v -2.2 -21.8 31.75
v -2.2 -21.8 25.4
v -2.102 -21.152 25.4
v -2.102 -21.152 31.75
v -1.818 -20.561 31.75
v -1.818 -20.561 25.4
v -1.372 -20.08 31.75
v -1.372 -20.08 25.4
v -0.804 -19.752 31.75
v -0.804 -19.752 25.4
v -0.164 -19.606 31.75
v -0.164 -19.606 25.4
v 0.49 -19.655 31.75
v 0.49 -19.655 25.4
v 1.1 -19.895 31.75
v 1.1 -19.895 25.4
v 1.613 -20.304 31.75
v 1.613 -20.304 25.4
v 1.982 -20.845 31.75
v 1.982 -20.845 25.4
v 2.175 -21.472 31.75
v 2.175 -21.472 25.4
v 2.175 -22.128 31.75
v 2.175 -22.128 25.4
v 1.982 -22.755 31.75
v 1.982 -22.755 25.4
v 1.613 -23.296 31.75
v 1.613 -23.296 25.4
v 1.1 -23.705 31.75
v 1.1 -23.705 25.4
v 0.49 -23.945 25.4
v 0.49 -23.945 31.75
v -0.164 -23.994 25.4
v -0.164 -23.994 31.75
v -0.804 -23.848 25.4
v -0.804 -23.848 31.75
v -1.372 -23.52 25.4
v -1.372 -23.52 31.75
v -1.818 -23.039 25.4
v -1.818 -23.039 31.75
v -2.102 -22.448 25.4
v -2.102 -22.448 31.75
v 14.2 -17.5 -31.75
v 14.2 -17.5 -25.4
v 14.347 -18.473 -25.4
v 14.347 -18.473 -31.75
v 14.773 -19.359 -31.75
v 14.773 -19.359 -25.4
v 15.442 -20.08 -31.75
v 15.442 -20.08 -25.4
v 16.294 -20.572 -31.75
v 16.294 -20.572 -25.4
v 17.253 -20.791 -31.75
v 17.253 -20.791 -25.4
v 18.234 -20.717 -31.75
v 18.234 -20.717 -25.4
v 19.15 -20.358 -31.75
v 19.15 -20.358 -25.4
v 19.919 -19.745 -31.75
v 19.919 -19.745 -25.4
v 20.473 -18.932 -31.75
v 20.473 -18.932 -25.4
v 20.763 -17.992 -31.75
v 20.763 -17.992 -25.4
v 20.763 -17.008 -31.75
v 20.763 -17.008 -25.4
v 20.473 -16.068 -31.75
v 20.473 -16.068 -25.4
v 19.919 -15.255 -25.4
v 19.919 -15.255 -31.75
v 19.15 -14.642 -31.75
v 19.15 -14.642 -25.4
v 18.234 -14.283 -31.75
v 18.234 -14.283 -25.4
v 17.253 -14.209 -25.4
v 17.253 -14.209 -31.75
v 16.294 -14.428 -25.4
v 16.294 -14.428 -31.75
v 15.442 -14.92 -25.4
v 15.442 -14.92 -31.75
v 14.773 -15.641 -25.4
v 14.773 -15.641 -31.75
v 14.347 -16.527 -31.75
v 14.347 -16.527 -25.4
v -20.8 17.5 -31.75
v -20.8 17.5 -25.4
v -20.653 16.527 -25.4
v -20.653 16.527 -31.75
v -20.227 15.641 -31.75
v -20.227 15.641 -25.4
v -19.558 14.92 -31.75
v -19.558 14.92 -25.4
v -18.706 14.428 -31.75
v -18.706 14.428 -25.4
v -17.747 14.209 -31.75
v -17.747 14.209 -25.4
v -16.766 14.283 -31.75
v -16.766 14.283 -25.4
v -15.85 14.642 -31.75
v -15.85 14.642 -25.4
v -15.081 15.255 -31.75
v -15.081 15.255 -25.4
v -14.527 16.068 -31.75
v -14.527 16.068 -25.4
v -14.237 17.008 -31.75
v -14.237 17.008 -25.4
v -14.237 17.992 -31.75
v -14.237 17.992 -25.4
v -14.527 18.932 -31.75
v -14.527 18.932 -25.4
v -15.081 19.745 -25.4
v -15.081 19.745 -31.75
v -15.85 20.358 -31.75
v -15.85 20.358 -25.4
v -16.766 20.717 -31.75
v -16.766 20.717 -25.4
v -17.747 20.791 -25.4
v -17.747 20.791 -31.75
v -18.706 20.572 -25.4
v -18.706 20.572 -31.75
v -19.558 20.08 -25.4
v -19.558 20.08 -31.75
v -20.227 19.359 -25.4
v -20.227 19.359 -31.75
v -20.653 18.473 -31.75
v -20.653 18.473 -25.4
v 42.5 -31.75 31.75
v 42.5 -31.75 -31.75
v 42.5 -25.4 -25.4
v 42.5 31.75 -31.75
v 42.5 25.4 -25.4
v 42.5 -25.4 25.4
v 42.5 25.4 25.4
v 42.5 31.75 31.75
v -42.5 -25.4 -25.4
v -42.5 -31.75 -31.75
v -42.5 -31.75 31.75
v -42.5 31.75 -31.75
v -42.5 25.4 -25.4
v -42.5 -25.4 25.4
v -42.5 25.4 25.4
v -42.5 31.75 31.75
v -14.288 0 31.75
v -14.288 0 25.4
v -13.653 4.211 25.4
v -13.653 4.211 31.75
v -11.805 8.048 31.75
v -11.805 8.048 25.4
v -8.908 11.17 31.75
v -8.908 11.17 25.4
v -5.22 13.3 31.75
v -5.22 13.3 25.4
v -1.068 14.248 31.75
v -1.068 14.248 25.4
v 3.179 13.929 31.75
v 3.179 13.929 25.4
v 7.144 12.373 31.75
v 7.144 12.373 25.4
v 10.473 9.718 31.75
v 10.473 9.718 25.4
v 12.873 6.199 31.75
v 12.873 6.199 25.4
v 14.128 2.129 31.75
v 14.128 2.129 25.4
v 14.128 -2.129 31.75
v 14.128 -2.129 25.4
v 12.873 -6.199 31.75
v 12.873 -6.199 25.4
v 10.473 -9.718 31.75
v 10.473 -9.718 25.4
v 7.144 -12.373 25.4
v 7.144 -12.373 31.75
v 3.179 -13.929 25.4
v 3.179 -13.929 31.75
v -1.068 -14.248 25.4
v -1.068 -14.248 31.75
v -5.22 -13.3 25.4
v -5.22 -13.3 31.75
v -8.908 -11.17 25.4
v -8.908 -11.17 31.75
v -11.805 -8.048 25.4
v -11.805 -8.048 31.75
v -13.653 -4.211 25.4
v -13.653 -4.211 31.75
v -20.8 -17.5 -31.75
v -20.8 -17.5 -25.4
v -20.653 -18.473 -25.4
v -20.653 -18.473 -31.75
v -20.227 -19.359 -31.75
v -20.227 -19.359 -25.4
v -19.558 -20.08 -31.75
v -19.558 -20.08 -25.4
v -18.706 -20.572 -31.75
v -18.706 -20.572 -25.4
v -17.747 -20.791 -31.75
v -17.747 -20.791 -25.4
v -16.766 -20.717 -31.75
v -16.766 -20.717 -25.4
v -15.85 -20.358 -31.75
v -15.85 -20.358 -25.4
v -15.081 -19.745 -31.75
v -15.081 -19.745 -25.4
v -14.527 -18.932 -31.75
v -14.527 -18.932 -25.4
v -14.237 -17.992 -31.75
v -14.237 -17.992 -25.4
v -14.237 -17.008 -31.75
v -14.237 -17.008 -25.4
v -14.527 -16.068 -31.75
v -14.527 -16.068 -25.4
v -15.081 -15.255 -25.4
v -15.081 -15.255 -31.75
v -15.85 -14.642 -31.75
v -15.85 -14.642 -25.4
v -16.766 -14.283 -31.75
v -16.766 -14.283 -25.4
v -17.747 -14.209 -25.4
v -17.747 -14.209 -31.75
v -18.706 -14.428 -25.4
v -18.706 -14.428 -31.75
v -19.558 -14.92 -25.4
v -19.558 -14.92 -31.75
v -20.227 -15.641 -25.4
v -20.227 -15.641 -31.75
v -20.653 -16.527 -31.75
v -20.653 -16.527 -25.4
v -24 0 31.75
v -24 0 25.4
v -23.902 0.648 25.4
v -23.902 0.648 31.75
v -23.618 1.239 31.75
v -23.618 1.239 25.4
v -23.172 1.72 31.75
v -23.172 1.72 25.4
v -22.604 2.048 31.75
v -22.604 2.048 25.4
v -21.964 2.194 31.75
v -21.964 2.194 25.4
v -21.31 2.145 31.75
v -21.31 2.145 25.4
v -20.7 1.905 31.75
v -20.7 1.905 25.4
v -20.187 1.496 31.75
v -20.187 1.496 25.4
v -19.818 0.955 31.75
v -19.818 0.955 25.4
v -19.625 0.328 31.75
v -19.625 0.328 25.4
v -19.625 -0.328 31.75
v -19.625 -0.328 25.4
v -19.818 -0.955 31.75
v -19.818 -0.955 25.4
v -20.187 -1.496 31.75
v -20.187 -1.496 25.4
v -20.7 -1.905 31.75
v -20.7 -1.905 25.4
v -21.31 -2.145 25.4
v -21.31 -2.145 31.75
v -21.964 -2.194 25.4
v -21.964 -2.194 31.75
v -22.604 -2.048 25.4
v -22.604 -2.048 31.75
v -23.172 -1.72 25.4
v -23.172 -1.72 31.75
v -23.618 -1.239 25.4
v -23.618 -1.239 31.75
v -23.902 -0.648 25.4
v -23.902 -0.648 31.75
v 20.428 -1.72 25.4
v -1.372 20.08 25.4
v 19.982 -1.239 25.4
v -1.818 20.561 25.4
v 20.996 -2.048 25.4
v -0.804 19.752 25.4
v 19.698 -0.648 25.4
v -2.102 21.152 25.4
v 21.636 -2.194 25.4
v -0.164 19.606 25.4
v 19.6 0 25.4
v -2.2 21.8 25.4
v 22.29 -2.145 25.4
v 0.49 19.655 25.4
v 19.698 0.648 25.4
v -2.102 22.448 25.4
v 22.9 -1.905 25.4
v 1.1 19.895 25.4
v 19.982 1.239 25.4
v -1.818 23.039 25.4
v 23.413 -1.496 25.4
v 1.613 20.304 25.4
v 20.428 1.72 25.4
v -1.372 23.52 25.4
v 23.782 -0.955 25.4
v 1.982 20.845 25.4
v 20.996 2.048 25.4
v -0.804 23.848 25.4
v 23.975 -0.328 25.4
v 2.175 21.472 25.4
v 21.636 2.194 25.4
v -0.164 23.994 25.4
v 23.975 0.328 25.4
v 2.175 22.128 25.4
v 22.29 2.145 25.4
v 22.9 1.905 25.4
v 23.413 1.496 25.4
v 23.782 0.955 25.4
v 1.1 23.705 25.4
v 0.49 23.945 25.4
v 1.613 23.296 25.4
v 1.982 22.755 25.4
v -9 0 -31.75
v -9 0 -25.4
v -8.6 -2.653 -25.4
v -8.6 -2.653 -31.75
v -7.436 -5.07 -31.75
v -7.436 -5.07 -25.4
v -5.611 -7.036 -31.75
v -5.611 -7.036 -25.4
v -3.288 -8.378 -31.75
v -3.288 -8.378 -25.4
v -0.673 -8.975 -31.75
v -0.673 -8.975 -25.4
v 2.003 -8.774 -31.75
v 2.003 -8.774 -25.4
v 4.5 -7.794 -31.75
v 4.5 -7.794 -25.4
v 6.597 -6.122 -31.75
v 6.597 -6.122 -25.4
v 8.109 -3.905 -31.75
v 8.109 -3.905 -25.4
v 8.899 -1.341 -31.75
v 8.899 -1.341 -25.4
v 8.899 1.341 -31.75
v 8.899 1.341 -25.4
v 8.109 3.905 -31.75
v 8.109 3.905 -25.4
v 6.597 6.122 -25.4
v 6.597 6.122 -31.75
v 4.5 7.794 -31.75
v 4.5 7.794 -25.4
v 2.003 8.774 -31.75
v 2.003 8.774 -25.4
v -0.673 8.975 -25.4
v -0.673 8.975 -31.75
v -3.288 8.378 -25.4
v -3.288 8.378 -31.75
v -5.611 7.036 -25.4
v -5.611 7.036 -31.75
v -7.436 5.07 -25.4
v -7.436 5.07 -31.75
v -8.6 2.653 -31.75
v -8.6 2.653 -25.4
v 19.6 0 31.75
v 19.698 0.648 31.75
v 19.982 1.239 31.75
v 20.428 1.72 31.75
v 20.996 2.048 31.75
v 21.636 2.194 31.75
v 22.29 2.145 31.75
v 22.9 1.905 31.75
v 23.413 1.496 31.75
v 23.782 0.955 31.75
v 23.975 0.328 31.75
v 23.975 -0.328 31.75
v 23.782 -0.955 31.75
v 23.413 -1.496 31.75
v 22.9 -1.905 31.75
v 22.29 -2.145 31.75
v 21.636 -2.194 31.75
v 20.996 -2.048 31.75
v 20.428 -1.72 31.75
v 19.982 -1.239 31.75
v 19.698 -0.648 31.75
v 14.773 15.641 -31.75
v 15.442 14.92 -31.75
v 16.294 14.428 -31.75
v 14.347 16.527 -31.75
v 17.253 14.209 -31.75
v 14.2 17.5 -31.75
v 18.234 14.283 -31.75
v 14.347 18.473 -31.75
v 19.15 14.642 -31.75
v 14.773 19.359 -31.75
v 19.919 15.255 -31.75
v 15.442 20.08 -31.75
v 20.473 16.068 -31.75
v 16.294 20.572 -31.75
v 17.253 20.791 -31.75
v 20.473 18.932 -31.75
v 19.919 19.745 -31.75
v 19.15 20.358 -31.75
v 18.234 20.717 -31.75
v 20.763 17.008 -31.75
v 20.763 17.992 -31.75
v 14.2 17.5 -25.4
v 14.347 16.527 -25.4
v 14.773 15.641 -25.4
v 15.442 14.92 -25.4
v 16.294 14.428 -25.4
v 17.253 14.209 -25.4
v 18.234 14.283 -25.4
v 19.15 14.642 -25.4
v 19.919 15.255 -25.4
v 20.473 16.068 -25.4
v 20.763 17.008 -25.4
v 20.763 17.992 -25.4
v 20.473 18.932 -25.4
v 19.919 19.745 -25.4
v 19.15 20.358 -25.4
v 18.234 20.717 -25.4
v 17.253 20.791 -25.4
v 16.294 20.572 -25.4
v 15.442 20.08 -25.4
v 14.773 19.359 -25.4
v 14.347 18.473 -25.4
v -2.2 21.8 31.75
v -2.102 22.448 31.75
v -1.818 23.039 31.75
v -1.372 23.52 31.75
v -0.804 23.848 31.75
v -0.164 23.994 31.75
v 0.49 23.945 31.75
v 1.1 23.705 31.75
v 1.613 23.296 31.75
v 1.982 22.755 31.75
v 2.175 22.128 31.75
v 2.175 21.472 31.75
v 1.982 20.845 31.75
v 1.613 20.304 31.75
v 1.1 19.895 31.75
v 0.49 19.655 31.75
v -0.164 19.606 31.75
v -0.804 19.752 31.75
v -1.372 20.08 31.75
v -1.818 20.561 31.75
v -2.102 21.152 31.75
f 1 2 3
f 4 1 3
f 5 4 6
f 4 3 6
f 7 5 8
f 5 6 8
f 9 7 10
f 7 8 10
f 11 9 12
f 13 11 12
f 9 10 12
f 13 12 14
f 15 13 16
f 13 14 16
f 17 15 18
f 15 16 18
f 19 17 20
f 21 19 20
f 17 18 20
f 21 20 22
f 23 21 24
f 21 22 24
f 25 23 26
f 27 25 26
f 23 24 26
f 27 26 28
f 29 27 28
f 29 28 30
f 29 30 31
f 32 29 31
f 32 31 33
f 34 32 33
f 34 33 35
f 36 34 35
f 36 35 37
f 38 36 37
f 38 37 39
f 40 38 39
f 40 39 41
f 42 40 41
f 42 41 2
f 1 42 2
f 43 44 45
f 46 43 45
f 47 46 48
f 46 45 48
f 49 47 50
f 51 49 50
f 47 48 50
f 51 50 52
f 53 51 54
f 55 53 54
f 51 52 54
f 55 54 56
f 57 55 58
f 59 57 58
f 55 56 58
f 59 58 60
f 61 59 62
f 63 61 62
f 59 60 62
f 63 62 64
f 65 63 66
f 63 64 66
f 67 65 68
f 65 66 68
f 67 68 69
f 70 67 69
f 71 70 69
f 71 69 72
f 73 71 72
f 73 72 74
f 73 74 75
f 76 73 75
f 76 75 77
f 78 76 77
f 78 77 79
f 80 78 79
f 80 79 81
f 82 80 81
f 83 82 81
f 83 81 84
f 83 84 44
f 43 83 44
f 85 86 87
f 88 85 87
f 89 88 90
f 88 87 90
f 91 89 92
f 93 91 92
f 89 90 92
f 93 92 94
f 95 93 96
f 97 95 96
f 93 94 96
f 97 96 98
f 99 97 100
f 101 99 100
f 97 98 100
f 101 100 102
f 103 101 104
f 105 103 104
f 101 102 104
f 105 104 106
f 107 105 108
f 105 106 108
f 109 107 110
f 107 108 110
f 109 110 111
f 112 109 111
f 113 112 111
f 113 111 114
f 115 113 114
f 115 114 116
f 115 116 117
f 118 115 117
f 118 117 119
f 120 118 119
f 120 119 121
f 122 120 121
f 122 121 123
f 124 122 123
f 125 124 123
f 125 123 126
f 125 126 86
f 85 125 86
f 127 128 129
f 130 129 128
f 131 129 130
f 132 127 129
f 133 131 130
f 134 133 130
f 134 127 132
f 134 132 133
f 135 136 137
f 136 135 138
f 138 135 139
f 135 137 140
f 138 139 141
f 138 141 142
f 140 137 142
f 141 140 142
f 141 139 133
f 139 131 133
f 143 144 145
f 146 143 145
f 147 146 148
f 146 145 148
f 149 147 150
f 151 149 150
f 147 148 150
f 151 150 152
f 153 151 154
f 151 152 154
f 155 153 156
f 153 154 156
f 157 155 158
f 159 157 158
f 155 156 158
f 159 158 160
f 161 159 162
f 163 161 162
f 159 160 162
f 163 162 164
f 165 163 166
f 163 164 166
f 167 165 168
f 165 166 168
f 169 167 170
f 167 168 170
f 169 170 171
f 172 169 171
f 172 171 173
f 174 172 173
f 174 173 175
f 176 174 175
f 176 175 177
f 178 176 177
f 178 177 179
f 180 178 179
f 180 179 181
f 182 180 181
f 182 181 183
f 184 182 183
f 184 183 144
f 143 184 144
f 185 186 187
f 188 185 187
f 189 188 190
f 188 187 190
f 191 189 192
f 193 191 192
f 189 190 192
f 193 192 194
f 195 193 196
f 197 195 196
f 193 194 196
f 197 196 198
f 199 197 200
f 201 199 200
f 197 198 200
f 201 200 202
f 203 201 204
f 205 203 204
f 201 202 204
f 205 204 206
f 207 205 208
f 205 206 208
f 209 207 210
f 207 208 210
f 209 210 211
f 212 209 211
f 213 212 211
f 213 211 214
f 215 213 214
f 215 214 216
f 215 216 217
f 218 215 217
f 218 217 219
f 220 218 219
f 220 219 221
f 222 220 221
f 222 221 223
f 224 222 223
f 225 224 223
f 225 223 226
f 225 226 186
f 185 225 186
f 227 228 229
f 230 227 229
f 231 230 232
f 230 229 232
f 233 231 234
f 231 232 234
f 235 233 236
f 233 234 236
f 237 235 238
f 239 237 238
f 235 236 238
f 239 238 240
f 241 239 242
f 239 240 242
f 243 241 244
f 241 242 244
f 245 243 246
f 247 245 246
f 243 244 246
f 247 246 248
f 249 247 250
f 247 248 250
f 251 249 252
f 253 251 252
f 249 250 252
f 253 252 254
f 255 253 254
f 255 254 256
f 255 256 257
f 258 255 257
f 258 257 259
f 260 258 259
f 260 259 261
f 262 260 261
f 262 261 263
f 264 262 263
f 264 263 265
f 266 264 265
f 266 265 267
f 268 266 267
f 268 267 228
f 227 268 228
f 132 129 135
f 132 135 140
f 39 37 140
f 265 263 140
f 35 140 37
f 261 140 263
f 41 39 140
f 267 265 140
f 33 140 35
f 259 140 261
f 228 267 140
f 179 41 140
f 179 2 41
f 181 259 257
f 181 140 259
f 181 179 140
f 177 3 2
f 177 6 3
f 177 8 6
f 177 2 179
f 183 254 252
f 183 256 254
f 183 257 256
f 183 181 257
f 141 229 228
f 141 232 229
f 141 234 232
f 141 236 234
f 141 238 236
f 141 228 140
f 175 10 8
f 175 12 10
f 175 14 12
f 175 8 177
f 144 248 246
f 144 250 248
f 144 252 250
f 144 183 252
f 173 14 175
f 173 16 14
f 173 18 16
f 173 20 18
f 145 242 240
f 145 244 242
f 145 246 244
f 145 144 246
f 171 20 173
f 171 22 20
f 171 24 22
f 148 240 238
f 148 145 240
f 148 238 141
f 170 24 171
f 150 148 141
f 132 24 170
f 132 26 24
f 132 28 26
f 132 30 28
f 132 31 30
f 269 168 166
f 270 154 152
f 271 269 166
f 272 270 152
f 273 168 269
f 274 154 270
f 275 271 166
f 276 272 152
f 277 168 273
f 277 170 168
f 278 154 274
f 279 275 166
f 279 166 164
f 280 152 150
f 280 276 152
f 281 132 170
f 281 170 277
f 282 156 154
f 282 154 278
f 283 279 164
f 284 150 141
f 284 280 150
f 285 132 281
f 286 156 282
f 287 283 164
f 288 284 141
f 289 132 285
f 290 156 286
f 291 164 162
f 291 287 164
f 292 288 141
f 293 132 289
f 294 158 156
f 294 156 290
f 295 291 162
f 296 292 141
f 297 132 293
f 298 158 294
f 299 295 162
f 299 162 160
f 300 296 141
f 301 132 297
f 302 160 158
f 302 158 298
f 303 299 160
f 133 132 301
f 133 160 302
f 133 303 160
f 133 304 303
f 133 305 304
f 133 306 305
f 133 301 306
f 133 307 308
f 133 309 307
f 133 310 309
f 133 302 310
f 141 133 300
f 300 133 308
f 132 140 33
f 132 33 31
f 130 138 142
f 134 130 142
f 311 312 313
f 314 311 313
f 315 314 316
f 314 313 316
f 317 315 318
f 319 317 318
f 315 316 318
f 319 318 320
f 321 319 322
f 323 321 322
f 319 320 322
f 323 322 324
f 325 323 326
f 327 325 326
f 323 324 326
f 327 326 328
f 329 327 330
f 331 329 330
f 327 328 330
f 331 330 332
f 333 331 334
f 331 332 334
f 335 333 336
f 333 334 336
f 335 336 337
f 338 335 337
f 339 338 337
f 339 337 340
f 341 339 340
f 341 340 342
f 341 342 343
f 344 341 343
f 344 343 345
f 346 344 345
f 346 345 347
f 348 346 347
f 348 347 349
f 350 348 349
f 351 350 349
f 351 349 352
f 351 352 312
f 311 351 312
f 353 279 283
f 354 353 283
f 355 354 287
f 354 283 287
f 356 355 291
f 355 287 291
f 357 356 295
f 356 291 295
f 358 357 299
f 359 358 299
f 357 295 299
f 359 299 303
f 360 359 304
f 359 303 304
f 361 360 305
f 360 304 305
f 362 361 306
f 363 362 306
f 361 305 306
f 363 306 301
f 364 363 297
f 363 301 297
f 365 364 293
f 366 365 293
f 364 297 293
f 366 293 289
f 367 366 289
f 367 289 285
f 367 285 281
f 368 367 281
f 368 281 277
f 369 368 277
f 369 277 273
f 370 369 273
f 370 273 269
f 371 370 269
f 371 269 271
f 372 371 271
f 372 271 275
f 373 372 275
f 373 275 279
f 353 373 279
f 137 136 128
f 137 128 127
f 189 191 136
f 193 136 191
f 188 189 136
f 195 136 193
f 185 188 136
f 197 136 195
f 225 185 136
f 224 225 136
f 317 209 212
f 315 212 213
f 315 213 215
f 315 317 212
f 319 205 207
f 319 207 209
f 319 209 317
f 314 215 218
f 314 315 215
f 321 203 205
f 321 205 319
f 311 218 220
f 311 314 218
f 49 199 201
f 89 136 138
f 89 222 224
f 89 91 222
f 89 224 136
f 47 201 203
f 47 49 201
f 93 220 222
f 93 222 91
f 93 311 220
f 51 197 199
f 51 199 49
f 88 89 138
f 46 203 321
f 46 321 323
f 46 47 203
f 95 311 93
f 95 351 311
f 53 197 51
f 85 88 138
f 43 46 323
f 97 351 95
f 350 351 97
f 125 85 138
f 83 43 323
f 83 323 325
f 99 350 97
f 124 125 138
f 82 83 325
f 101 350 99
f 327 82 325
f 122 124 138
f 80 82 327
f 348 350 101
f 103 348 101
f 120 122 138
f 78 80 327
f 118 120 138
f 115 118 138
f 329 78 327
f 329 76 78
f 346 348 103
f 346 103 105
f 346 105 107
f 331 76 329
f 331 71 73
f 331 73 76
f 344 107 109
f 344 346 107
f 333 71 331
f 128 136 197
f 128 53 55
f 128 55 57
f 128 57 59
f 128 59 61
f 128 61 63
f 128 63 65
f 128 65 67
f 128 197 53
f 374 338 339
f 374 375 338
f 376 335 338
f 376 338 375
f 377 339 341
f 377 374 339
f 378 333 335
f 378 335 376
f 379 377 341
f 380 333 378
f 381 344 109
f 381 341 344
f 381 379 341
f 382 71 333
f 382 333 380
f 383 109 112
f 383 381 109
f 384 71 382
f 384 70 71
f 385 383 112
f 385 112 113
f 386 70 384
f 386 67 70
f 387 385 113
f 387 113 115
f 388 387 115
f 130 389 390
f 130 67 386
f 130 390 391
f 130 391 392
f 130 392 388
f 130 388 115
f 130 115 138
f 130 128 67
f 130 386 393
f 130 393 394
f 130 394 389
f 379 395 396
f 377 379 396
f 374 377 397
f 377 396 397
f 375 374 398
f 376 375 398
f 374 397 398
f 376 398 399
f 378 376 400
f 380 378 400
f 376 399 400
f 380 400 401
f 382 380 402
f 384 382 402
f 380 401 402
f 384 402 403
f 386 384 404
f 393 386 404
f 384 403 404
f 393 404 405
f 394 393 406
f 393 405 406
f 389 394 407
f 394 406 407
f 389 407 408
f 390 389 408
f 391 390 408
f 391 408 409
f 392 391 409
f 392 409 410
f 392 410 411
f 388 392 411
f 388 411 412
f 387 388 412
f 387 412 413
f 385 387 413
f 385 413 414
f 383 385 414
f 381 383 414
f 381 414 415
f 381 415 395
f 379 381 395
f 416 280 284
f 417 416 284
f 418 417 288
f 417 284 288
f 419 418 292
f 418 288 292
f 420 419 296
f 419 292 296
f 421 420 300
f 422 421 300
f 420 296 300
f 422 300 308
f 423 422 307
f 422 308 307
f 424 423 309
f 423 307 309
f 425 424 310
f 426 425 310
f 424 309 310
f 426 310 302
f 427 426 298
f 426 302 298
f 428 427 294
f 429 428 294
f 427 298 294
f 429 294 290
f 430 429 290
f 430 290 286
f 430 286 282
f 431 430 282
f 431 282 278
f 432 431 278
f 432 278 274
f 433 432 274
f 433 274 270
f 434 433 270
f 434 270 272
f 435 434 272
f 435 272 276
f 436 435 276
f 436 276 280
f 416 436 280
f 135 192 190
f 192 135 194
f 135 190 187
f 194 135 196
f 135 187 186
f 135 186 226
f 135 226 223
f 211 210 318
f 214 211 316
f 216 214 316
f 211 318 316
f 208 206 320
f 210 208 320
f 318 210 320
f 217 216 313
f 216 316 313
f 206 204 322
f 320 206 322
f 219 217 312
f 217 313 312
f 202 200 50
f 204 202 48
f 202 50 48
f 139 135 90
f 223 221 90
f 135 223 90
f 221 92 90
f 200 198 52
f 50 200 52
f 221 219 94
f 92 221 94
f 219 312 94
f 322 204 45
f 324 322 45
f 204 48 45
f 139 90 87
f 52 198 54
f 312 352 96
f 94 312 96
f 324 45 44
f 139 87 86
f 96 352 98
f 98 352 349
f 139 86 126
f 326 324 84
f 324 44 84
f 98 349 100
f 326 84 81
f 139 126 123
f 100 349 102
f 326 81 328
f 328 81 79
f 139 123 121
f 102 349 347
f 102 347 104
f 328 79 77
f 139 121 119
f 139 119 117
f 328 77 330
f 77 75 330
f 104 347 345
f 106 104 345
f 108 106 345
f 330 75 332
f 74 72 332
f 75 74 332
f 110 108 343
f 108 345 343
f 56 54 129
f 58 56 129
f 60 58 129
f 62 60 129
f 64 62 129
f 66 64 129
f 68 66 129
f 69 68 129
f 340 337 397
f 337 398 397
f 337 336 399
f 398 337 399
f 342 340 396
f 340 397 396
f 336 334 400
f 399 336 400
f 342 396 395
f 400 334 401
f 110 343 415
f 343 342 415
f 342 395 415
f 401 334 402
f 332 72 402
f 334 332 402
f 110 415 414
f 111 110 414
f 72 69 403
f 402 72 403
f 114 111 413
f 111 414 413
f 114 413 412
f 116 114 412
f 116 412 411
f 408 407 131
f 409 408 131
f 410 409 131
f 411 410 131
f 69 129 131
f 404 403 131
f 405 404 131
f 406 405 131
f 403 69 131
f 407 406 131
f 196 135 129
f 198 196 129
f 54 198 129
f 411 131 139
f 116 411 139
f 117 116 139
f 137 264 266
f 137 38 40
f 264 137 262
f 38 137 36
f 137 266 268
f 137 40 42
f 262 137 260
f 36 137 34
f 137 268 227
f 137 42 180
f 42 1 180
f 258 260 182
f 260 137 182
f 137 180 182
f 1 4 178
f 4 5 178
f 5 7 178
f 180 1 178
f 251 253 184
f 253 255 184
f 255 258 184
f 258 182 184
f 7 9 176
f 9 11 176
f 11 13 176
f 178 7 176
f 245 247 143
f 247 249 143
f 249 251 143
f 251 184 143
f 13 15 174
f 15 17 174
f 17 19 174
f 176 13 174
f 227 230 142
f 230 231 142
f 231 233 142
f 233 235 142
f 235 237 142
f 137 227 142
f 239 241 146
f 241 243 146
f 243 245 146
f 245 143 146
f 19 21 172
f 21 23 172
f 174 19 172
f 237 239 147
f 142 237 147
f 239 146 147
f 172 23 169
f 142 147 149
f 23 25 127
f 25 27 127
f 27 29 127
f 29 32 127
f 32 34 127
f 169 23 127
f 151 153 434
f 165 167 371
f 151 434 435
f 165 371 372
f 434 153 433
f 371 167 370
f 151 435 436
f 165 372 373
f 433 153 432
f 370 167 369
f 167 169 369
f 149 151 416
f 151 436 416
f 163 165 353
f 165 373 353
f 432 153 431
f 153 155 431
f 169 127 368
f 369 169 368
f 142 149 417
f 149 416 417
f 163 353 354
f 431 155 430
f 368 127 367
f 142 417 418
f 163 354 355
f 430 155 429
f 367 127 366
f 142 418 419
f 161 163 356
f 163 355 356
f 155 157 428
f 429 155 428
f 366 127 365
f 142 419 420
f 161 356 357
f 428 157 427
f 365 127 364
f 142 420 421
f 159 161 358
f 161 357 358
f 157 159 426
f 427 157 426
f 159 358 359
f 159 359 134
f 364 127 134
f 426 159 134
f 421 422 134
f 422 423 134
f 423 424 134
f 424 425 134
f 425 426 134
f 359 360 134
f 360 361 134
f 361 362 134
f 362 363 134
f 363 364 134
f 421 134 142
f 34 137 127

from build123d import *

# Parameters (mm, degrees)
F0_W          = 63.5
F0_H          = 63.5
F0_W_2        = 50.8
F0_H_2        = 50.8
F1_DEPTH      = 42.5
F1_DEPTH_BACK = 42.5
F3_D          = 4.4
F3_DEPTH      = 14.1
F3_TIP        = 1.3218933619
F5_D          = 28.575
F5_DEPTH      = 10
F5_TIP        = 8.5847960944
F7_D          = 6.6
F7_DEPTH      = 10
F7_TIP        = 1.9828400428
F9_D          = 18
F9_DEPTH      = 10
F9_TIP        = 5.4077455712


with BuildPart() as f1:
    # F0 (on Right) → F1 (new body, two sides)
    with BuildSketch(Plane.YZ) as f1_sk:
        Rectangle(F0_W, F0_H)
        Rectangle(F0_W_2, F0_H_2, mode=Mode.SUBTRACT)
    extrude(amount=F1_DEPTH)
    extrude(f1_sk.sketch, amount=-F1_DEPTH_BACK)

    # F3
    with Locations(Plane.XY.offset(31.75)):
        with Locations((-21.8, 0), (0, -21.8), (21.8, 0), (0, 21.8)):
            Hole(F3_D / 2, depth=F3_DEPTH)
            with Locations((0, 0, -(F3_DEPTH + F3_TIP / 2))):  # 118° drill point
                Cone(0, F3_D / 2, F3_TIP, mode=Mode.SUBTRACT)

    # F5
    with Locations(Plane.XY.offset(31.75)):
        with Locations((0, 0)):
            Hole(F5_D / 2, depth=F5_DEPTH)
            with Locations((0, 0, -(F5_DEPTH + F5_TIP / 2))):  # 118° drill point
                Cone(0, F5_D / 2, F5_TIP, mode=Mode.SUBTRACT)

    # F7
    with Locations(Plane(origin=(0, 0, -31.75), x_dir=(1, 0, 0), z_dir=(0, 0, -1))):
        with Locations((-17.5, -17.5), (-17.5, 17.5), (17.5, 17.5), (17.5, -17.5)):
            Hole(F7_D / 2, depth=F7_DEPTH)
            with Locations((0, 0, -(F7_DEPTH + F7_TIP / 2))):  # 118° drill point
                Cone(0, F7_D / 2, F7_TIP, mode=Mode.SUBTRACT)

    # F9
    with Locations(Plane(origin=(0, 0, -31.75), x_dir=(1, 0, 0), z_dir=(0, 0, -1))):
        with Locations((0, 0)):
            Hole(F9_D / 2, depth=F9_DEPTH)
            with Locations((0, 0, -(F9_DEPTH + F9_TIP / 2))):  # 118° drill point
                Cone(0, F9_D / 2, F9_TIP, mode=Mode.SUBTRACT)


solid = f1.part
